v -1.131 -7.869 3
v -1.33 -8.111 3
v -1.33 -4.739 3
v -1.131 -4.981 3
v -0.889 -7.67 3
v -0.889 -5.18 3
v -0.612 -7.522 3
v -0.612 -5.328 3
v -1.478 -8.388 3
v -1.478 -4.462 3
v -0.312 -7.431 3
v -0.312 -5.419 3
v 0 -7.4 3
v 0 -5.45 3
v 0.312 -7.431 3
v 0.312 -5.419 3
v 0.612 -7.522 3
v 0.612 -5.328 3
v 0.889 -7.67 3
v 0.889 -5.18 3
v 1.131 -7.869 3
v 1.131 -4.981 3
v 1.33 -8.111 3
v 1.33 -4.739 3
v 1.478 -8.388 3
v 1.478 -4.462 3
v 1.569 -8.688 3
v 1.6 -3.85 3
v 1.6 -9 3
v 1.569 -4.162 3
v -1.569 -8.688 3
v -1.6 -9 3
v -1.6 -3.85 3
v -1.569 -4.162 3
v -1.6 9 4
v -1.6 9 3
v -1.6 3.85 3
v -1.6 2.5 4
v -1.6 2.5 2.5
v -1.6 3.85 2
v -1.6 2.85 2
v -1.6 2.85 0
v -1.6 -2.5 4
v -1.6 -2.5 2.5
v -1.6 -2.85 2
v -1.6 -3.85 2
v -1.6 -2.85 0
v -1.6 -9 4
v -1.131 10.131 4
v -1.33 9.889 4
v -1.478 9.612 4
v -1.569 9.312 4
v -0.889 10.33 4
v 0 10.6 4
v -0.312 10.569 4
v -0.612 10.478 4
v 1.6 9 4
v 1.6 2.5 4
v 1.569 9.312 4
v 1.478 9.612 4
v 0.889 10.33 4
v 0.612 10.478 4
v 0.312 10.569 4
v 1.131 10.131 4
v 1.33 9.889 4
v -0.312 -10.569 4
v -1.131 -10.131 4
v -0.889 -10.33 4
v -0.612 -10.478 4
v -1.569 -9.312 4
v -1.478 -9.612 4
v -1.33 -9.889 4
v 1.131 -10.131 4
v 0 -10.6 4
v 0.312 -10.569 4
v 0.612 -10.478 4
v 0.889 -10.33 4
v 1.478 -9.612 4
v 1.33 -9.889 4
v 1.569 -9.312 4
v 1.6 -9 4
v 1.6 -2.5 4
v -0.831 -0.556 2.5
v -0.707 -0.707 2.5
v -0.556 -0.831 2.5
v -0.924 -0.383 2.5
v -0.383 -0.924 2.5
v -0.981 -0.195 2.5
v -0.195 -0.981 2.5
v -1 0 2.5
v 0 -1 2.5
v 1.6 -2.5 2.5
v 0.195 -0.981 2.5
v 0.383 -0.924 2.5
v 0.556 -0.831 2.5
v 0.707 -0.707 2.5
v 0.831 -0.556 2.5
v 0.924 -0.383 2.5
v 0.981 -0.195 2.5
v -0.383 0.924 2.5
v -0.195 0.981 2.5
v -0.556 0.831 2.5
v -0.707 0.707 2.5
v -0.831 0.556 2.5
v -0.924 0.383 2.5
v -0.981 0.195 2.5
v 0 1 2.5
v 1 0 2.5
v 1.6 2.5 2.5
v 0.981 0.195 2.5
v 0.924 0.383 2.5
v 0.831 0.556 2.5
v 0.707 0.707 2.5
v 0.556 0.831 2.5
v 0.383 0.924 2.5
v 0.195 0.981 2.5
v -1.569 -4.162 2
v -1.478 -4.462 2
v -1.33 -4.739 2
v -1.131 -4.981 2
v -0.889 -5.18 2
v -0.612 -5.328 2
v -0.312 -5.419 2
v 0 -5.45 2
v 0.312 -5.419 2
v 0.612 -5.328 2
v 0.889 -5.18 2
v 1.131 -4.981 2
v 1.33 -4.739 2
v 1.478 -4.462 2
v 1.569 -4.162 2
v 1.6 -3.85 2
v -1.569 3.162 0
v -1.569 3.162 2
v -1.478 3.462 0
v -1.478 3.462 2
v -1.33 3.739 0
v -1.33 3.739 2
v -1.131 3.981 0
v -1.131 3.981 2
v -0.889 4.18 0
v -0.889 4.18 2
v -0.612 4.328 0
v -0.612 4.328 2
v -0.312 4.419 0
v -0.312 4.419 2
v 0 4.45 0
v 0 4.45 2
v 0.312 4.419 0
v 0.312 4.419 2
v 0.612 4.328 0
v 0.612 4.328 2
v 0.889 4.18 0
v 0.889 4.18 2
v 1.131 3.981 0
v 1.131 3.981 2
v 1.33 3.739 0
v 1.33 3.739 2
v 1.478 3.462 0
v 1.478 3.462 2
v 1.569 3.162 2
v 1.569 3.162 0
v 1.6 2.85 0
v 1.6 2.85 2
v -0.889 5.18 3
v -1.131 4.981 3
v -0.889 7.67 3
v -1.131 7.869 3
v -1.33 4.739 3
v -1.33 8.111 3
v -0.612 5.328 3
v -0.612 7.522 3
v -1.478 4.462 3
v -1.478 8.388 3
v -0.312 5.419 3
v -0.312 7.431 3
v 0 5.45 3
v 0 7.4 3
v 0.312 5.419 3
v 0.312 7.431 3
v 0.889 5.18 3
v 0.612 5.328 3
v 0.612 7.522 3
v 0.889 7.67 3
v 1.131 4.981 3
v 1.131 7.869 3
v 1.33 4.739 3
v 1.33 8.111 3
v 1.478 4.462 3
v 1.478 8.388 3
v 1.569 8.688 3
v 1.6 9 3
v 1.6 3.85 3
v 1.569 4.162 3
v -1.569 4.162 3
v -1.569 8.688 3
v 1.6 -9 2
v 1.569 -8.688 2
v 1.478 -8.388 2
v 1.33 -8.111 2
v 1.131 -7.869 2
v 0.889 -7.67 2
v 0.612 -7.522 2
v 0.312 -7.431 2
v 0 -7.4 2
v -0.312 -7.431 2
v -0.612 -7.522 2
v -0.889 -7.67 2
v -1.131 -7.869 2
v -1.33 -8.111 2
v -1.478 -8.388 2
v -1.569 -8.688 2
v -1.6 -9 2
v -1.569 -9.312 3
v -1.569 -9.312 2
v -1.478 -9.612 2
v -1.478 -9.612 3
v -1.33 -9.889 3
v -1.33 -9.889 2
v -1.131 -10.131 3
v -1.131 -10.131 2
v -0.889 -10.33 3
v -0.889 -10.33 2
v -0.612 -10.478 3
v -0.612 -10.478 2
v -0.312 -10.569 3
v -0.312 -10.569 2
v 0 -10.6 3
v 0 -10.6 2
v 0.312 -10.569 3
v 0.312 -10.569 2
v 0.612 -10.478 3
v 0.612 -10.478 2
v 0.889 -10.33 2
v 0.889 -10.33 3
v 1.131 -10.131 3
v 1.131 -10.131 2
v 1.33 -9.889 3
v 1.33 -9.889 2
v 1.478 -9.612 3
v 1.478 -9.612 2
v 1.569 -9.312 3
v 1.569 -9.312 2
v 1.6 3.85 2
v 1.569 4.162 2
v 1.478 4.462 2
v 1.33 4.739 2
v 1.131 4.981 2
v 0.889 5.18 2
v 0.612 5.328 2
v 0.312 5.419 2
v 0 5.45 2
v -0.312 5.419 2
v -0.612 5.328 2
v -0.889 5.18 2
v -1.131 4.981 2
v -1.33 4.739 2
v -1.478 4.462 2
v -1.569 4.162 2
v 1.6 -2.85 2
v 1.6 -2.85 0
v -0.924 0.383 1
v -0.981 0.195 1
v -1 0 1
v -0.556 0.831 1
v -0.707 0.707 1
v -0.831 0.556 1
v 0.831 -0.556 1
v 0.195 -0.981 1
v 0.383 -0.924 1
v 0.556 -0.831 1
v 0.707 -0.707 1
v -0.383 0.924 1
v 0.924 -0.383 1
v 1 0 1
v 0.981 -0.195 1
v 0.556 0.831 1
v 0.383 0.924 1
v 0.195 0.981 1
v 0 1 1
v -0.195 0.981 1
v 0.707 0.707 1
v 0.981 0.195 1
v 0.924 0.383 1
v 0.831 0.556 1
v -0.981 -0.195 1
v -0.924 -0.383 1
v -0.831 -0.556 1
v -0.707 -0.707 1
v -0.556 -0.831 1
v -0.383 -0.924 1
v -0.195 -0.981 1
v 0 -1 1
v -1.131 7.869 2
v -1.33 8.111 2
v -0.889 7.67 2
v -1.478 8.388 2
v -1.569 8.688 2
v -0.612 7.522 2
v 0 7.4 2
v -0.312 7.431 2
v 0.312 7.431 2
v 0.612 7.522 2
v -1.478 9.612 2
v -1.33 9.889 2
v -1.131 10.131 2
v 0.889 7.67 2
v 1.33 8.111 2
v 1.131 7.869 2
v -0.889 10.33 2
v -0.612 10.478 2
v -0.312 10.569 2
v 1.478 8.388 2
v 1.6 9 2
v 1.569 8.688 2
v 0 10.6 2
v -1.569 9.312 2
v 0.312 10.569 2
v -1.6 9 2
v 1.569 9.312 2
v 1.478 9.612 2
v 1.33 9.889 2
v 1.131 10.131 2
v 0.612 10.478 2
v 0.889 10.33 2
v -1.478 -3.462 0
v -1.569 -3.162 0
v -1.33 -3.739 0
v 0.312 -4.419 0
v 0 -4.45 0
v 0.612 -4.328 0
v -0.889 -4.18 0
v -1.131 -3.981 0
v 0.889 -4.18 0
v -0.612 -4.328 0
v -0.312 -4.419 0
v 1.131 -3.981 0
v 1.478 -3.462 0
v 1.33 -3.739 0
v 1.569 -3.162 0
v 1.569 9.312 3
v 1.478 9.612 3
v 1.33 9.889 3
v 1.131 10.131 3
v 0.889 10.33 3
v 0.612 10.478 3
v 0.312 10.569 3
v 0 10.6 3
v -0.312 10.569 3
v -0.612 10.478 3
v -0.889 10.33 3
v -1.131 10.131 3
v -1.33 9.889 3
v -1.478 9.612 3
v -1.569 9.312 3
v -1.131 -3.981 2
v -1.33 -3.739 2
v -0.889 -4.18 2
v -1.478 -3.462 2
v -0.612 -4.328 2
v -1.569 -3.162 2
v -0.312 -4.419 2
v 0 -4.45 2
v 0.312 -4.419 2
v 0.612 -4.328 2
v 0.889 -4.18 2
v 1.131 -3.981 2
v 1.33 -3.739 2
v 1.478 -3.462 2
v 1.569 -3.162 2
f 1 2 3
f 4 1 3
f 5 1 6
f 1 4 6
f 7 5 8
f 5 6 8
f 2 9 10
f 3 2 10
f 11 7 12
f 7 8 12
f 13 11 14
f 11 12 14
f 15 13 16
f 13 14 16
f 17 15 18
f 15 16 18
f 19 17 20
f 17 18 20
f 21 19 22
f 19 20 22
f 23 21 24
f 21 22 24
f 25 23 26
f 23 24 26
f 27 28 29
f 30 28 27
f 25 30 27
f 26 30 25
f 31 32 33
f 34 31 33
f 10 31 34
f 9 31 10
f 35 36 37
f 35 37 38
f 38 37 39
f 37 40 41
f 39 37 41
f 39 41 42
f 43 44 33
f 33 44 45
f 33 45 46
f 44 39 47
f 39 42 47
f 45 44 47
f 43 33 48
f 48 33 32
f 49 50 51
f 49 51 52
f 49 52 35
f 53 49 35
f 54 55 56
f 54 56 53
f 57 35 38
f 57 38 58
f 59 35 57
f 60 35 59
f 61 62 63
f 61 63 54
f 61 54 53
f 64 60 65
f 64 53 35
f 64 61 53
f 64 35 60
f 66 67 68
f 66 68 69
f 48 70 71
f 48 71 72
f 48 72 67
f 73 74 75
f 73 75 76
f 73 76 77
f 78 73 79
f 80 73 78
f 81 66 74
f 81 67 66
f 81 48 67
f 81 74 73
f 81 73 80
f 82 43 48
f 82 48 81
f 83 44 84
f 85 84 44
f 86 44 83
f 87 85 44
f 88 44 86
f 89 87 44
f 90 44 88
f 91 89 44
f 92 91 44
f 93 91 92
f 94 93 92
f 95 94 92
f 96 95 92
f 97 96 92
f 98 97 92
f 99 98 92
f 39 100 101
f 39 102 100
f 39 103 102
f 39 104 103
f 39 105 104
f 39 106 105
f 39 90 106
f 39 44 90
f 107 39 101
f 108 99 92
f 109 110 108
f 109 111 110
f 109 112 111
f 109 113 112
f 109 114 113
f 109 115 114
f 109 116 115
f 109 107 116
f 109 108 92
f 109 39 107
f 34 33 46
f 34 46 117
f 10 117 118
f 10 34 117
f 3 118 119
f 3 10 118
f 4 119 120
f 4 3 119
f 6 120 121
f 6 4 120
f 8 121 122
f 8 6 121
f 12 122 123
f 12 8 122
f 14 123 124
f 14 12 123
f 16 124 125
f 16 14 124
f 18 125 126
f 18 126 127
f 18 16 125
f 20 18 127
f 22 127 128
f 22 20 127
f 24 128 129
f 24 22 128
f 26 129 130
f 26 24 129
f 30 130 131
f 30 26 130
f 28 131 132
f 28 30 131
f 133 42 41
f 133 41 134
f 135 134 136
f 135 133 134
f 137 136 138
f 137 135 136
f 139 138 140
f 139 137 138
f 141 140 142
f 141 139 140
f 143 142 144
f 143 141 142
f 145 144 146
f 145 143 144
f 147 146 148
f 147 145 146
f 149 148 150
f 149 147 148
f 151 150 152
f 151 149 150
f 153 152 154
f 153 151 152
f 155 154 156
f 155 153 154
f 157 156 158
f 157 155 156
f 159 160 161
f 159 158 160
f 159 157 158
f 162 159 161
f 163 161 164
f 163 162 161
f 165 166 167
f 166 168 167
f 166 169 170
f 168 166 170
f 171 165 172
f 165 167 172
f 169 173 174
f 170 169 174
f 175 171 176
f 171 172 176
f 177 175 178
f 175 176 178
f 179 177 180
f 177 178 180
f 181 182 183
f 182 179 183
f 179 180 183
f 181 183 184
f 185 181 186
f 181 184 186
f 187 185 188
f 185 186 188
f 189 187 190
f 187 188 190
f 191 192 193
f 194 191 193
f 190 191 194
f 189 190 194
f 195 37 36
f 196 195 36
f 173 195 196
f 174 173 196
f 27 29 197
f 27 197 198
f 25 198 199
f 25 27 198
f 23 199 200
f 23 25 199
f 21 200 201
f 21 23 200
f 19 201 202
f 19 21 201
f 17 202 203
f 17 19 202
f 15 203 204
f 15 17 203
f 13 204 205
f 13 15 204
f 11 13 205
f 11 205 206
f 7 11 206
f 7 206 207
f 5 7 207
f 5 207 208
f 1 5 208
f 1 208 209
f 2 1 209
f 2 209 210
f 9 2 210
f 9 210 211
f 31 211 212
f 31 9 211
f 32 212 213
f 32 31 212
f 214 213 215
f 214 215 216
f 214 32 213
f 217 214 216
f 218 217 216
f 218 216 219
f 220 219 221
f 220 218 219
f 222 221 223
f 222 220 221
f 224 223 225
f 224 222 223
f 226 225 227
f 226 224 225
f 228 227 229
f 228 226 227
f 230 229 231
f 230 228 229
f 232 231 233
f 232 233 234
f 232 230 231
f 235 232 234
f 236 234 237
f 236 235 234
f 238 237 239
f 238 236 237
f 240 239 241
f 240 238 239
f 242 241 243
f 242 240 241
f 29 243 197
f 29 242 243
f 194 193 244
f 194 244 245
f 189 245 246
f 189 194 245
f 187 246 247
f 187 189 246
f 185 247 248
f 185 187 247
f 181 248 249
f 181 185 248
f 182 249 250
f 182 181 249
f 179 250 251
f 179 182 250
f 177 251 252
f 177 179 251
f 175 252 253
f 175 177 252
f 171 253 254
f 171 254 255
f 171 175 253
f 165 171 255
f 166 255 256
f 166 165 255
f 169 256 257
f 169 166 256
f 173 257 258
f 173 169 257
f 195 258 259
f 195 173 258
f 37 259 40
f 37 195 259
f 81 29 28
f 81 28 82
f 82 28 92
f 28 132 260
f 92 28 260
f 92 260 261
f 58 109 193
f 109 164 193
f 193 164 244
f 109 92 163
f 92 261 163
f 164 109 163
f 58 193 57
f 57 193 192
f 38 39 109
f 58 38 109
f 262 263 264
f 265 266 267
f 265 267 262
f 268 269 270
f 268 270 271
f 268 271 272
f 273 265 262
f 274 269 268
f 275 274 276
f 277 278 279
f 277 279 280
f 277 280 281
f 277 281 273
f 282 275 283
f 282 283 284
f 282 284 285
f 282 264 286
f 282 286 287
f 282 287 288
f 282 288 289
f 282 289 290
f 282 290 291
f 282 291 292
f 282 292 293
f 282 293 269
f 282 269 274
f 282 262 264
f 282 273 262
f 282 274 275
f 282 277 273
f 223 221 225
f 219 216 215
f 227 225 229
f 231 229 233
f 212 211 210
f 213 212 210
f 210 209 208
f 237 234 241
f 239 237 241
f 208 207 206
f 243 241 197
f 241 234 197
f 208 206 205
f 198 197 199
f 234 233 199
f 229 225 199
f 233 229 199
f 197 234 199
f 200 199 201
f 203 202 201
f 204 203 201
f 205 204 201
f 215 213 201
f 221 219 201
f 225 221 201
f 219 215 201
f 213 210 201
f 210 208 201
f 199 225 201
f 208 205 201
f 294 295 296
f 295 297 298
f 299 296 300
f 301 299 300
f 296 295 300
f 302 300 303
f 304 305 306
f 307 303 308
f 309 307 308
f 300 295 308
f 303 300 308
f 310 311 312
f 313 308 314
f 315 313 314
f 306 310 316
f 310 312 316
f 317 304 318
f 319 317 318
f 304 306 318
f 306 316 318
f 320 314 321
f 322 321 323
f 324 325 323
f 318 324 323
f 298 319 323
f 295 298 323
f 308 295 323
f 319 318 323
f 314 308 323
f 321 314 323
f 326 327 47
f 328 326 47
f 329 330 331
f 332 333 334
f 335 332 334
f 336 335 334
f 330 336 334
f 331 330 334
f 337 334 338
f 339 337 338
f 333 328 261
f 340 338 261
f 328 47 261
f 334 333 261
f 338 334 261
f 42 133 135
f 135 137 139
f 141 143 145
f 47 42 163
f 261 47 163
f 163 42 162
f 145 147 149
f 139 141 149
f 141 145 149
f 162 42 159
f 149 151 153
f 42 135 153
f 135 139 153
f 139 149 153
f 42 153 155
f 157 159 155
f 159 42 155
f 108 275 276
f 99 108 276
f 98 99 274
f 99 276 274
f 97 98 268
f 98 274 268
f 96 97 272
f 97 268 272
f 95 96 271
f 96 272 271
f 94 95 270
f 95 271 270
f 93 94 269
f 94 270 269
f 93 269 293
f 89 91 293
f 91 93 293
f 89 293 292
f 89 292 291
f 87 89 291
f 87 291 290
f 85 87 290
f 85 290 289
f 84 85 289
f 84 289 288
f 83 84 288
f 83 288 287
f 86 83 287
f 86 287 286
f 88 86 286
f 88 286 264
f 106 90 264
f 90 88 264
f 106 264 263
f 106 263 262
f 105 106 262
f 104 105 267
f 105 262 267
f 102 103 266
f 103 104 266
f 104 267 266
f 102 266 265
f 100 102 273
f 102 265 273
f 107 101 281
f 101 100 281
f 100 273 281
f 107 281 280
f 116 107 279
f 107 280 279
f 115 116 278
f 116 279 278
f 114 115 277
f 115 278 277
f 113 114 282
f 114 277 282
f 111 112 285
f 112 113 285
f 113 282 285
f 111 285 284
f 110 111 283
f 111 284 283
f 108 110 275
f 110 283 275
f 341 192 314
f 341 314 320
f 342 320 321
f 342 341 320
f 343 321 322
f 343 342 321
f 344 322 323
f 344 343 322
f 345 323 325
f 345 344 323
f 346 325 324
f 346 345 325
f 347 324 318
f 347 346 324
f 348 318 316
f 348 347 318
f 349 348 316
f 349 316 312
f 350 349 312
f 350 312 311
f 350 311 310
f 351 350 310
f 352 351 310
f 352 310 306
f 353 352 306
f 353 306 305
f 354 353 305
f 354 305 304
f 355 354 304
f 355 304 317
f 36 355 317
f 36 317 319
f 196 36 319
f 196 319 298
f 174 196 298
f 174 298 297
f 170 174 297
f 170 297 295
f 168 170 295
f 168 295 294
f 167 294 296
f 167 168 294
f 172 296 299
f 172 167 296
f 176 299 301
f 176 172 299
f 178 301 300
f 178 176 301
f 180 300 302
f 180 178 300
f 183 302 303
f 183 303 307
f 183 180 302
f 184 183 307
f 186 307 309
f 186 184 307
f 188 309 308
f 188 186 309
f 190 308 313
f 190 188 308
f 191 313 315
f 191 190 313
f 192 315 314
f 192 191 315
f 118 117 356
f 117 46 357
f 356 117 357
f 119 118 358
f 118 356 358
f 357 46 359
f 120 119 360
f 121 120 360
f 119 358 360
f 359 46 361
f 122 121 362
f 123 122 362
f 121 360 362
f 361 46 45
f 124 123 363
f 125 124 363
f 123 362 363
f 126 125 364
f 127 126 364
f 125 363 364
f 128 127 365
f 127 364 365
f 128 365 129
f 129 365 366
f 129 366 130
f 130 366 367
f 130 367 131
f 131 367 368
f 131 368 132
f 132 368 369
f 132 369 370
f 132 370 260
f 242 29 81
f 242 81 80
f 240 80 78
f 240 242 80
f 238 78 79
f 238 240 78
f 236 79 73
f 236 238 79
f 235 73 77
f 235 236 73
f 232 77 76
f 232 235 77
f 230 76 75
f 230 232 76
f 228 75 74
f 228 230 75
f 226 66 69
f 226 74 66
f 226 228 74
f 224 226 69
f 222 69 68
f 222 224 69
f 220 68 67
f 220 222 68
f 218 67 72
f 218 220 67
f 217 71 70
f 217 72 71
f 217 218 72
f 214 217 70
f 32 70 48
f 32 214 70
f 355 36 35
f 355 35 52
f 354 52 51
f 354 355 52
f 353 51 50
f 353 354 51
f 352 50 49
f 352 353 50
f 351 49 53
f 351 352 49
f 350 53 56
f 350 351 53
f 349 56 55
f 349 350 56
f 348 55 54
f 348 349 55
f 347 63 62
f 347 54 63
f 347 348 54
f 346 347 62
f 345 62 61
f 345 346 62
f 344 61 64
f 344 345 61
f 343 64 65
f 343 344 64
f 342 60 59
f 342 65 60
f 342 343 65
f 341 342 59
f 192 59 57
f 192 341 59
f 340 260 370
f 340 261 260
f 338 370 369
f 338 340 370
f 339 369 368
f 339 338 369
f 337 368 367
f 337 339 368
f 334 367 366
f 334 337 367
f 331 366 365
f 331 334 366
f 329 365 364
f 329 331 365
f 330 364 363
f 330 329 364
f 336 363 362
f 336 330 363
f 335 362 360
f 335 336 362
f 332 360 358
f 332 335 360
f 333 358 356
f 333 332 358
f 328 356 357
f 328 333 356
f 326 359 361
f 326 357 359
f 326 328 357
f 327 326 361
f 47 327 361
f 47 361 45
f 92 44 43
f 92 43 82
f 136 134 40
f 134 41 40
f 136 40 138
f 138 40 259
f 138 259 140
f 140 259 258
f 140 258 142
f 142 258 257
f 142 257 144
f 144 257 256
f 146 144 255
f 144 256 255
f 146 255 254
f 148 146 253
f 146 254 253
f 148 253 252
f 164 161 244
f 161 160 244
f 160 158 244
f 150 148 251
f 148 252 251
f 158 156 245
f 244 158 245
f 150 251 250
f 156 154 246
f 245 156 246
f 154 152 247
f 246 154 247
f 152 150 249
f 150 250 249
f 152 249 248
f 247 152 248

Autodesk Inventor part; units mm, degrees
ref_plane "YZ Plane" through (0, 0, 0) normal (1, 0, 0) x (0, 1, 0)
ref_plane "XZ Plane" through (0, 0, 0) normal (0, 1, 0) x (-1, 0, 0)
ref_plane "XY Plane" through (0, 0, 0) normal (0, 0, 1) x (1, 0, 0)
sketch "Sketch1" plane through (0, 0, 0) normal (0, 0, 1) x (1, 0, 0)
  line L0 (-2.31, 0) -> (2.31, 0) construction
  line L1 (0, 14.84) -> (0, -14.84) construction
  line L2 (0, 2.85) -> (0, -2.85) construction
  line L3 (-1.6, 2.85) -> (-1.6, -2.85)
  line L4 (1.6, -2.85) -> (1.6, 2.85)
  arc A0 (1.6, 2.85) -> (-1.6, 2.85) centre (0, 2.85) ccw
  arc A1 (-1.6, -2.85) -> (1.6, -2.85) centre (0, -2.85) ccw
  circle A2 centre (0, 0) radius 1
  line L5 (-1.6, 2.85) -> (-1.6, 9)
  arc A3 (1.6, 9) -> (-1.6, 9) centre (0, 9) ccw
  line L6 (1.6, 9) -> (1.6, 2.85)
  line L7 (-1.6, 2.85) -> (-1.6, 3.5)
  line L8 (1.6, 2.85) -> (1.6, 3.5)
  arc A4 (-1.6, 9) -> (1.6, 9) centre (0, 9) ccw
  line L9 (-1.6, -2.85) -> (-1.6, -9)
  arc A5 (-1.6, -9) -> (1.6, -9) centre (0, -9) ccw
  line L10 (1.6, -9) -> (1.6, -2.85)
  line L11 (-1.6, -2.85) -> (-1.6, -3.5)
  line L12 (1.6, -2.85) -> (1.6, -3.5)
  arc A6 (1.6, -9) -> (-1.6, -9) centre (0, -9) ccw
  line L13 (-1.6, 2.5) -> (1.6, 2.5)
  line L14 (-1.6, -2.5) -> (1.6, -2.5)
  arc A7 (-1.6, -3.85) -> (1.6, -3.85) centre (0, -3.85) ccw
  arc A8 (1.6, 3.85) -> (-1.6, 3.85) centre (0, 3.85) ccw
  point P0 (0, 4.45)
  point P1 (0, -4.45)
  point P2 (1.65, -3)
  point P3 (1.6008, -3)
  point P4 (-1.6008, -3)
  point P5 (-1.65, -3)
  point P6 (1.6, -2.85)
  point P7 (-1.6, -2.85)
  point P8 (-1.65, 3)
  point P9 (-1.6008, 3)
  point P10 (1.6008, 3)
  point P11 (1.65, 3)
  dimension "d2" = 2
  dimension "d16" = 2.5
  dimension "d17" = 8.9
  dimension "d18" = 3.2
  dimension "d22" = 1
extrude "Extrusion1" add sketch "Sketch1" along normal blind 1 contours A0 L4 L13 L3 | L13 L4 L14 L3 | L14 L4 A1 L3 | A2
extrude "Extrusion2" add sketch "Sketch1" along normal blind 1.5 from surface at 1 contours A0 L4 L13 L3 | L13 L4 L14 L3 | L14 L4 A1 L3
extrude "Extrusion3" add sketch "Sketch1" along normal blind 0.5 from surface at 2.5 contours A0 L4 L13 L3 | L14 L4 A1 L3
extrude "Extrusion4" add sketch "Sketch1" along normal blind 1 from surface at 3 contours A0 L4 L13 L3 | L5 A8 L6 A0 | L14 L4 A1 L3 | L5 A4 L6 A8 | A1 L10 A7 L9 | A3 A4 | A7 L10 A6 L9 | A6 A5
extrude "Extrusion5" add sketch "Sketch1" against normal blind 1 from surface at 3 contours A3 A4 | A6 A5
extrude "Extrusion6" add sketch "Sketch1" against normal blind 1 from surface at 3 contours L5 A8 L6 A0 | A1 L10 A7 L9
properties part number "Button Cap"
